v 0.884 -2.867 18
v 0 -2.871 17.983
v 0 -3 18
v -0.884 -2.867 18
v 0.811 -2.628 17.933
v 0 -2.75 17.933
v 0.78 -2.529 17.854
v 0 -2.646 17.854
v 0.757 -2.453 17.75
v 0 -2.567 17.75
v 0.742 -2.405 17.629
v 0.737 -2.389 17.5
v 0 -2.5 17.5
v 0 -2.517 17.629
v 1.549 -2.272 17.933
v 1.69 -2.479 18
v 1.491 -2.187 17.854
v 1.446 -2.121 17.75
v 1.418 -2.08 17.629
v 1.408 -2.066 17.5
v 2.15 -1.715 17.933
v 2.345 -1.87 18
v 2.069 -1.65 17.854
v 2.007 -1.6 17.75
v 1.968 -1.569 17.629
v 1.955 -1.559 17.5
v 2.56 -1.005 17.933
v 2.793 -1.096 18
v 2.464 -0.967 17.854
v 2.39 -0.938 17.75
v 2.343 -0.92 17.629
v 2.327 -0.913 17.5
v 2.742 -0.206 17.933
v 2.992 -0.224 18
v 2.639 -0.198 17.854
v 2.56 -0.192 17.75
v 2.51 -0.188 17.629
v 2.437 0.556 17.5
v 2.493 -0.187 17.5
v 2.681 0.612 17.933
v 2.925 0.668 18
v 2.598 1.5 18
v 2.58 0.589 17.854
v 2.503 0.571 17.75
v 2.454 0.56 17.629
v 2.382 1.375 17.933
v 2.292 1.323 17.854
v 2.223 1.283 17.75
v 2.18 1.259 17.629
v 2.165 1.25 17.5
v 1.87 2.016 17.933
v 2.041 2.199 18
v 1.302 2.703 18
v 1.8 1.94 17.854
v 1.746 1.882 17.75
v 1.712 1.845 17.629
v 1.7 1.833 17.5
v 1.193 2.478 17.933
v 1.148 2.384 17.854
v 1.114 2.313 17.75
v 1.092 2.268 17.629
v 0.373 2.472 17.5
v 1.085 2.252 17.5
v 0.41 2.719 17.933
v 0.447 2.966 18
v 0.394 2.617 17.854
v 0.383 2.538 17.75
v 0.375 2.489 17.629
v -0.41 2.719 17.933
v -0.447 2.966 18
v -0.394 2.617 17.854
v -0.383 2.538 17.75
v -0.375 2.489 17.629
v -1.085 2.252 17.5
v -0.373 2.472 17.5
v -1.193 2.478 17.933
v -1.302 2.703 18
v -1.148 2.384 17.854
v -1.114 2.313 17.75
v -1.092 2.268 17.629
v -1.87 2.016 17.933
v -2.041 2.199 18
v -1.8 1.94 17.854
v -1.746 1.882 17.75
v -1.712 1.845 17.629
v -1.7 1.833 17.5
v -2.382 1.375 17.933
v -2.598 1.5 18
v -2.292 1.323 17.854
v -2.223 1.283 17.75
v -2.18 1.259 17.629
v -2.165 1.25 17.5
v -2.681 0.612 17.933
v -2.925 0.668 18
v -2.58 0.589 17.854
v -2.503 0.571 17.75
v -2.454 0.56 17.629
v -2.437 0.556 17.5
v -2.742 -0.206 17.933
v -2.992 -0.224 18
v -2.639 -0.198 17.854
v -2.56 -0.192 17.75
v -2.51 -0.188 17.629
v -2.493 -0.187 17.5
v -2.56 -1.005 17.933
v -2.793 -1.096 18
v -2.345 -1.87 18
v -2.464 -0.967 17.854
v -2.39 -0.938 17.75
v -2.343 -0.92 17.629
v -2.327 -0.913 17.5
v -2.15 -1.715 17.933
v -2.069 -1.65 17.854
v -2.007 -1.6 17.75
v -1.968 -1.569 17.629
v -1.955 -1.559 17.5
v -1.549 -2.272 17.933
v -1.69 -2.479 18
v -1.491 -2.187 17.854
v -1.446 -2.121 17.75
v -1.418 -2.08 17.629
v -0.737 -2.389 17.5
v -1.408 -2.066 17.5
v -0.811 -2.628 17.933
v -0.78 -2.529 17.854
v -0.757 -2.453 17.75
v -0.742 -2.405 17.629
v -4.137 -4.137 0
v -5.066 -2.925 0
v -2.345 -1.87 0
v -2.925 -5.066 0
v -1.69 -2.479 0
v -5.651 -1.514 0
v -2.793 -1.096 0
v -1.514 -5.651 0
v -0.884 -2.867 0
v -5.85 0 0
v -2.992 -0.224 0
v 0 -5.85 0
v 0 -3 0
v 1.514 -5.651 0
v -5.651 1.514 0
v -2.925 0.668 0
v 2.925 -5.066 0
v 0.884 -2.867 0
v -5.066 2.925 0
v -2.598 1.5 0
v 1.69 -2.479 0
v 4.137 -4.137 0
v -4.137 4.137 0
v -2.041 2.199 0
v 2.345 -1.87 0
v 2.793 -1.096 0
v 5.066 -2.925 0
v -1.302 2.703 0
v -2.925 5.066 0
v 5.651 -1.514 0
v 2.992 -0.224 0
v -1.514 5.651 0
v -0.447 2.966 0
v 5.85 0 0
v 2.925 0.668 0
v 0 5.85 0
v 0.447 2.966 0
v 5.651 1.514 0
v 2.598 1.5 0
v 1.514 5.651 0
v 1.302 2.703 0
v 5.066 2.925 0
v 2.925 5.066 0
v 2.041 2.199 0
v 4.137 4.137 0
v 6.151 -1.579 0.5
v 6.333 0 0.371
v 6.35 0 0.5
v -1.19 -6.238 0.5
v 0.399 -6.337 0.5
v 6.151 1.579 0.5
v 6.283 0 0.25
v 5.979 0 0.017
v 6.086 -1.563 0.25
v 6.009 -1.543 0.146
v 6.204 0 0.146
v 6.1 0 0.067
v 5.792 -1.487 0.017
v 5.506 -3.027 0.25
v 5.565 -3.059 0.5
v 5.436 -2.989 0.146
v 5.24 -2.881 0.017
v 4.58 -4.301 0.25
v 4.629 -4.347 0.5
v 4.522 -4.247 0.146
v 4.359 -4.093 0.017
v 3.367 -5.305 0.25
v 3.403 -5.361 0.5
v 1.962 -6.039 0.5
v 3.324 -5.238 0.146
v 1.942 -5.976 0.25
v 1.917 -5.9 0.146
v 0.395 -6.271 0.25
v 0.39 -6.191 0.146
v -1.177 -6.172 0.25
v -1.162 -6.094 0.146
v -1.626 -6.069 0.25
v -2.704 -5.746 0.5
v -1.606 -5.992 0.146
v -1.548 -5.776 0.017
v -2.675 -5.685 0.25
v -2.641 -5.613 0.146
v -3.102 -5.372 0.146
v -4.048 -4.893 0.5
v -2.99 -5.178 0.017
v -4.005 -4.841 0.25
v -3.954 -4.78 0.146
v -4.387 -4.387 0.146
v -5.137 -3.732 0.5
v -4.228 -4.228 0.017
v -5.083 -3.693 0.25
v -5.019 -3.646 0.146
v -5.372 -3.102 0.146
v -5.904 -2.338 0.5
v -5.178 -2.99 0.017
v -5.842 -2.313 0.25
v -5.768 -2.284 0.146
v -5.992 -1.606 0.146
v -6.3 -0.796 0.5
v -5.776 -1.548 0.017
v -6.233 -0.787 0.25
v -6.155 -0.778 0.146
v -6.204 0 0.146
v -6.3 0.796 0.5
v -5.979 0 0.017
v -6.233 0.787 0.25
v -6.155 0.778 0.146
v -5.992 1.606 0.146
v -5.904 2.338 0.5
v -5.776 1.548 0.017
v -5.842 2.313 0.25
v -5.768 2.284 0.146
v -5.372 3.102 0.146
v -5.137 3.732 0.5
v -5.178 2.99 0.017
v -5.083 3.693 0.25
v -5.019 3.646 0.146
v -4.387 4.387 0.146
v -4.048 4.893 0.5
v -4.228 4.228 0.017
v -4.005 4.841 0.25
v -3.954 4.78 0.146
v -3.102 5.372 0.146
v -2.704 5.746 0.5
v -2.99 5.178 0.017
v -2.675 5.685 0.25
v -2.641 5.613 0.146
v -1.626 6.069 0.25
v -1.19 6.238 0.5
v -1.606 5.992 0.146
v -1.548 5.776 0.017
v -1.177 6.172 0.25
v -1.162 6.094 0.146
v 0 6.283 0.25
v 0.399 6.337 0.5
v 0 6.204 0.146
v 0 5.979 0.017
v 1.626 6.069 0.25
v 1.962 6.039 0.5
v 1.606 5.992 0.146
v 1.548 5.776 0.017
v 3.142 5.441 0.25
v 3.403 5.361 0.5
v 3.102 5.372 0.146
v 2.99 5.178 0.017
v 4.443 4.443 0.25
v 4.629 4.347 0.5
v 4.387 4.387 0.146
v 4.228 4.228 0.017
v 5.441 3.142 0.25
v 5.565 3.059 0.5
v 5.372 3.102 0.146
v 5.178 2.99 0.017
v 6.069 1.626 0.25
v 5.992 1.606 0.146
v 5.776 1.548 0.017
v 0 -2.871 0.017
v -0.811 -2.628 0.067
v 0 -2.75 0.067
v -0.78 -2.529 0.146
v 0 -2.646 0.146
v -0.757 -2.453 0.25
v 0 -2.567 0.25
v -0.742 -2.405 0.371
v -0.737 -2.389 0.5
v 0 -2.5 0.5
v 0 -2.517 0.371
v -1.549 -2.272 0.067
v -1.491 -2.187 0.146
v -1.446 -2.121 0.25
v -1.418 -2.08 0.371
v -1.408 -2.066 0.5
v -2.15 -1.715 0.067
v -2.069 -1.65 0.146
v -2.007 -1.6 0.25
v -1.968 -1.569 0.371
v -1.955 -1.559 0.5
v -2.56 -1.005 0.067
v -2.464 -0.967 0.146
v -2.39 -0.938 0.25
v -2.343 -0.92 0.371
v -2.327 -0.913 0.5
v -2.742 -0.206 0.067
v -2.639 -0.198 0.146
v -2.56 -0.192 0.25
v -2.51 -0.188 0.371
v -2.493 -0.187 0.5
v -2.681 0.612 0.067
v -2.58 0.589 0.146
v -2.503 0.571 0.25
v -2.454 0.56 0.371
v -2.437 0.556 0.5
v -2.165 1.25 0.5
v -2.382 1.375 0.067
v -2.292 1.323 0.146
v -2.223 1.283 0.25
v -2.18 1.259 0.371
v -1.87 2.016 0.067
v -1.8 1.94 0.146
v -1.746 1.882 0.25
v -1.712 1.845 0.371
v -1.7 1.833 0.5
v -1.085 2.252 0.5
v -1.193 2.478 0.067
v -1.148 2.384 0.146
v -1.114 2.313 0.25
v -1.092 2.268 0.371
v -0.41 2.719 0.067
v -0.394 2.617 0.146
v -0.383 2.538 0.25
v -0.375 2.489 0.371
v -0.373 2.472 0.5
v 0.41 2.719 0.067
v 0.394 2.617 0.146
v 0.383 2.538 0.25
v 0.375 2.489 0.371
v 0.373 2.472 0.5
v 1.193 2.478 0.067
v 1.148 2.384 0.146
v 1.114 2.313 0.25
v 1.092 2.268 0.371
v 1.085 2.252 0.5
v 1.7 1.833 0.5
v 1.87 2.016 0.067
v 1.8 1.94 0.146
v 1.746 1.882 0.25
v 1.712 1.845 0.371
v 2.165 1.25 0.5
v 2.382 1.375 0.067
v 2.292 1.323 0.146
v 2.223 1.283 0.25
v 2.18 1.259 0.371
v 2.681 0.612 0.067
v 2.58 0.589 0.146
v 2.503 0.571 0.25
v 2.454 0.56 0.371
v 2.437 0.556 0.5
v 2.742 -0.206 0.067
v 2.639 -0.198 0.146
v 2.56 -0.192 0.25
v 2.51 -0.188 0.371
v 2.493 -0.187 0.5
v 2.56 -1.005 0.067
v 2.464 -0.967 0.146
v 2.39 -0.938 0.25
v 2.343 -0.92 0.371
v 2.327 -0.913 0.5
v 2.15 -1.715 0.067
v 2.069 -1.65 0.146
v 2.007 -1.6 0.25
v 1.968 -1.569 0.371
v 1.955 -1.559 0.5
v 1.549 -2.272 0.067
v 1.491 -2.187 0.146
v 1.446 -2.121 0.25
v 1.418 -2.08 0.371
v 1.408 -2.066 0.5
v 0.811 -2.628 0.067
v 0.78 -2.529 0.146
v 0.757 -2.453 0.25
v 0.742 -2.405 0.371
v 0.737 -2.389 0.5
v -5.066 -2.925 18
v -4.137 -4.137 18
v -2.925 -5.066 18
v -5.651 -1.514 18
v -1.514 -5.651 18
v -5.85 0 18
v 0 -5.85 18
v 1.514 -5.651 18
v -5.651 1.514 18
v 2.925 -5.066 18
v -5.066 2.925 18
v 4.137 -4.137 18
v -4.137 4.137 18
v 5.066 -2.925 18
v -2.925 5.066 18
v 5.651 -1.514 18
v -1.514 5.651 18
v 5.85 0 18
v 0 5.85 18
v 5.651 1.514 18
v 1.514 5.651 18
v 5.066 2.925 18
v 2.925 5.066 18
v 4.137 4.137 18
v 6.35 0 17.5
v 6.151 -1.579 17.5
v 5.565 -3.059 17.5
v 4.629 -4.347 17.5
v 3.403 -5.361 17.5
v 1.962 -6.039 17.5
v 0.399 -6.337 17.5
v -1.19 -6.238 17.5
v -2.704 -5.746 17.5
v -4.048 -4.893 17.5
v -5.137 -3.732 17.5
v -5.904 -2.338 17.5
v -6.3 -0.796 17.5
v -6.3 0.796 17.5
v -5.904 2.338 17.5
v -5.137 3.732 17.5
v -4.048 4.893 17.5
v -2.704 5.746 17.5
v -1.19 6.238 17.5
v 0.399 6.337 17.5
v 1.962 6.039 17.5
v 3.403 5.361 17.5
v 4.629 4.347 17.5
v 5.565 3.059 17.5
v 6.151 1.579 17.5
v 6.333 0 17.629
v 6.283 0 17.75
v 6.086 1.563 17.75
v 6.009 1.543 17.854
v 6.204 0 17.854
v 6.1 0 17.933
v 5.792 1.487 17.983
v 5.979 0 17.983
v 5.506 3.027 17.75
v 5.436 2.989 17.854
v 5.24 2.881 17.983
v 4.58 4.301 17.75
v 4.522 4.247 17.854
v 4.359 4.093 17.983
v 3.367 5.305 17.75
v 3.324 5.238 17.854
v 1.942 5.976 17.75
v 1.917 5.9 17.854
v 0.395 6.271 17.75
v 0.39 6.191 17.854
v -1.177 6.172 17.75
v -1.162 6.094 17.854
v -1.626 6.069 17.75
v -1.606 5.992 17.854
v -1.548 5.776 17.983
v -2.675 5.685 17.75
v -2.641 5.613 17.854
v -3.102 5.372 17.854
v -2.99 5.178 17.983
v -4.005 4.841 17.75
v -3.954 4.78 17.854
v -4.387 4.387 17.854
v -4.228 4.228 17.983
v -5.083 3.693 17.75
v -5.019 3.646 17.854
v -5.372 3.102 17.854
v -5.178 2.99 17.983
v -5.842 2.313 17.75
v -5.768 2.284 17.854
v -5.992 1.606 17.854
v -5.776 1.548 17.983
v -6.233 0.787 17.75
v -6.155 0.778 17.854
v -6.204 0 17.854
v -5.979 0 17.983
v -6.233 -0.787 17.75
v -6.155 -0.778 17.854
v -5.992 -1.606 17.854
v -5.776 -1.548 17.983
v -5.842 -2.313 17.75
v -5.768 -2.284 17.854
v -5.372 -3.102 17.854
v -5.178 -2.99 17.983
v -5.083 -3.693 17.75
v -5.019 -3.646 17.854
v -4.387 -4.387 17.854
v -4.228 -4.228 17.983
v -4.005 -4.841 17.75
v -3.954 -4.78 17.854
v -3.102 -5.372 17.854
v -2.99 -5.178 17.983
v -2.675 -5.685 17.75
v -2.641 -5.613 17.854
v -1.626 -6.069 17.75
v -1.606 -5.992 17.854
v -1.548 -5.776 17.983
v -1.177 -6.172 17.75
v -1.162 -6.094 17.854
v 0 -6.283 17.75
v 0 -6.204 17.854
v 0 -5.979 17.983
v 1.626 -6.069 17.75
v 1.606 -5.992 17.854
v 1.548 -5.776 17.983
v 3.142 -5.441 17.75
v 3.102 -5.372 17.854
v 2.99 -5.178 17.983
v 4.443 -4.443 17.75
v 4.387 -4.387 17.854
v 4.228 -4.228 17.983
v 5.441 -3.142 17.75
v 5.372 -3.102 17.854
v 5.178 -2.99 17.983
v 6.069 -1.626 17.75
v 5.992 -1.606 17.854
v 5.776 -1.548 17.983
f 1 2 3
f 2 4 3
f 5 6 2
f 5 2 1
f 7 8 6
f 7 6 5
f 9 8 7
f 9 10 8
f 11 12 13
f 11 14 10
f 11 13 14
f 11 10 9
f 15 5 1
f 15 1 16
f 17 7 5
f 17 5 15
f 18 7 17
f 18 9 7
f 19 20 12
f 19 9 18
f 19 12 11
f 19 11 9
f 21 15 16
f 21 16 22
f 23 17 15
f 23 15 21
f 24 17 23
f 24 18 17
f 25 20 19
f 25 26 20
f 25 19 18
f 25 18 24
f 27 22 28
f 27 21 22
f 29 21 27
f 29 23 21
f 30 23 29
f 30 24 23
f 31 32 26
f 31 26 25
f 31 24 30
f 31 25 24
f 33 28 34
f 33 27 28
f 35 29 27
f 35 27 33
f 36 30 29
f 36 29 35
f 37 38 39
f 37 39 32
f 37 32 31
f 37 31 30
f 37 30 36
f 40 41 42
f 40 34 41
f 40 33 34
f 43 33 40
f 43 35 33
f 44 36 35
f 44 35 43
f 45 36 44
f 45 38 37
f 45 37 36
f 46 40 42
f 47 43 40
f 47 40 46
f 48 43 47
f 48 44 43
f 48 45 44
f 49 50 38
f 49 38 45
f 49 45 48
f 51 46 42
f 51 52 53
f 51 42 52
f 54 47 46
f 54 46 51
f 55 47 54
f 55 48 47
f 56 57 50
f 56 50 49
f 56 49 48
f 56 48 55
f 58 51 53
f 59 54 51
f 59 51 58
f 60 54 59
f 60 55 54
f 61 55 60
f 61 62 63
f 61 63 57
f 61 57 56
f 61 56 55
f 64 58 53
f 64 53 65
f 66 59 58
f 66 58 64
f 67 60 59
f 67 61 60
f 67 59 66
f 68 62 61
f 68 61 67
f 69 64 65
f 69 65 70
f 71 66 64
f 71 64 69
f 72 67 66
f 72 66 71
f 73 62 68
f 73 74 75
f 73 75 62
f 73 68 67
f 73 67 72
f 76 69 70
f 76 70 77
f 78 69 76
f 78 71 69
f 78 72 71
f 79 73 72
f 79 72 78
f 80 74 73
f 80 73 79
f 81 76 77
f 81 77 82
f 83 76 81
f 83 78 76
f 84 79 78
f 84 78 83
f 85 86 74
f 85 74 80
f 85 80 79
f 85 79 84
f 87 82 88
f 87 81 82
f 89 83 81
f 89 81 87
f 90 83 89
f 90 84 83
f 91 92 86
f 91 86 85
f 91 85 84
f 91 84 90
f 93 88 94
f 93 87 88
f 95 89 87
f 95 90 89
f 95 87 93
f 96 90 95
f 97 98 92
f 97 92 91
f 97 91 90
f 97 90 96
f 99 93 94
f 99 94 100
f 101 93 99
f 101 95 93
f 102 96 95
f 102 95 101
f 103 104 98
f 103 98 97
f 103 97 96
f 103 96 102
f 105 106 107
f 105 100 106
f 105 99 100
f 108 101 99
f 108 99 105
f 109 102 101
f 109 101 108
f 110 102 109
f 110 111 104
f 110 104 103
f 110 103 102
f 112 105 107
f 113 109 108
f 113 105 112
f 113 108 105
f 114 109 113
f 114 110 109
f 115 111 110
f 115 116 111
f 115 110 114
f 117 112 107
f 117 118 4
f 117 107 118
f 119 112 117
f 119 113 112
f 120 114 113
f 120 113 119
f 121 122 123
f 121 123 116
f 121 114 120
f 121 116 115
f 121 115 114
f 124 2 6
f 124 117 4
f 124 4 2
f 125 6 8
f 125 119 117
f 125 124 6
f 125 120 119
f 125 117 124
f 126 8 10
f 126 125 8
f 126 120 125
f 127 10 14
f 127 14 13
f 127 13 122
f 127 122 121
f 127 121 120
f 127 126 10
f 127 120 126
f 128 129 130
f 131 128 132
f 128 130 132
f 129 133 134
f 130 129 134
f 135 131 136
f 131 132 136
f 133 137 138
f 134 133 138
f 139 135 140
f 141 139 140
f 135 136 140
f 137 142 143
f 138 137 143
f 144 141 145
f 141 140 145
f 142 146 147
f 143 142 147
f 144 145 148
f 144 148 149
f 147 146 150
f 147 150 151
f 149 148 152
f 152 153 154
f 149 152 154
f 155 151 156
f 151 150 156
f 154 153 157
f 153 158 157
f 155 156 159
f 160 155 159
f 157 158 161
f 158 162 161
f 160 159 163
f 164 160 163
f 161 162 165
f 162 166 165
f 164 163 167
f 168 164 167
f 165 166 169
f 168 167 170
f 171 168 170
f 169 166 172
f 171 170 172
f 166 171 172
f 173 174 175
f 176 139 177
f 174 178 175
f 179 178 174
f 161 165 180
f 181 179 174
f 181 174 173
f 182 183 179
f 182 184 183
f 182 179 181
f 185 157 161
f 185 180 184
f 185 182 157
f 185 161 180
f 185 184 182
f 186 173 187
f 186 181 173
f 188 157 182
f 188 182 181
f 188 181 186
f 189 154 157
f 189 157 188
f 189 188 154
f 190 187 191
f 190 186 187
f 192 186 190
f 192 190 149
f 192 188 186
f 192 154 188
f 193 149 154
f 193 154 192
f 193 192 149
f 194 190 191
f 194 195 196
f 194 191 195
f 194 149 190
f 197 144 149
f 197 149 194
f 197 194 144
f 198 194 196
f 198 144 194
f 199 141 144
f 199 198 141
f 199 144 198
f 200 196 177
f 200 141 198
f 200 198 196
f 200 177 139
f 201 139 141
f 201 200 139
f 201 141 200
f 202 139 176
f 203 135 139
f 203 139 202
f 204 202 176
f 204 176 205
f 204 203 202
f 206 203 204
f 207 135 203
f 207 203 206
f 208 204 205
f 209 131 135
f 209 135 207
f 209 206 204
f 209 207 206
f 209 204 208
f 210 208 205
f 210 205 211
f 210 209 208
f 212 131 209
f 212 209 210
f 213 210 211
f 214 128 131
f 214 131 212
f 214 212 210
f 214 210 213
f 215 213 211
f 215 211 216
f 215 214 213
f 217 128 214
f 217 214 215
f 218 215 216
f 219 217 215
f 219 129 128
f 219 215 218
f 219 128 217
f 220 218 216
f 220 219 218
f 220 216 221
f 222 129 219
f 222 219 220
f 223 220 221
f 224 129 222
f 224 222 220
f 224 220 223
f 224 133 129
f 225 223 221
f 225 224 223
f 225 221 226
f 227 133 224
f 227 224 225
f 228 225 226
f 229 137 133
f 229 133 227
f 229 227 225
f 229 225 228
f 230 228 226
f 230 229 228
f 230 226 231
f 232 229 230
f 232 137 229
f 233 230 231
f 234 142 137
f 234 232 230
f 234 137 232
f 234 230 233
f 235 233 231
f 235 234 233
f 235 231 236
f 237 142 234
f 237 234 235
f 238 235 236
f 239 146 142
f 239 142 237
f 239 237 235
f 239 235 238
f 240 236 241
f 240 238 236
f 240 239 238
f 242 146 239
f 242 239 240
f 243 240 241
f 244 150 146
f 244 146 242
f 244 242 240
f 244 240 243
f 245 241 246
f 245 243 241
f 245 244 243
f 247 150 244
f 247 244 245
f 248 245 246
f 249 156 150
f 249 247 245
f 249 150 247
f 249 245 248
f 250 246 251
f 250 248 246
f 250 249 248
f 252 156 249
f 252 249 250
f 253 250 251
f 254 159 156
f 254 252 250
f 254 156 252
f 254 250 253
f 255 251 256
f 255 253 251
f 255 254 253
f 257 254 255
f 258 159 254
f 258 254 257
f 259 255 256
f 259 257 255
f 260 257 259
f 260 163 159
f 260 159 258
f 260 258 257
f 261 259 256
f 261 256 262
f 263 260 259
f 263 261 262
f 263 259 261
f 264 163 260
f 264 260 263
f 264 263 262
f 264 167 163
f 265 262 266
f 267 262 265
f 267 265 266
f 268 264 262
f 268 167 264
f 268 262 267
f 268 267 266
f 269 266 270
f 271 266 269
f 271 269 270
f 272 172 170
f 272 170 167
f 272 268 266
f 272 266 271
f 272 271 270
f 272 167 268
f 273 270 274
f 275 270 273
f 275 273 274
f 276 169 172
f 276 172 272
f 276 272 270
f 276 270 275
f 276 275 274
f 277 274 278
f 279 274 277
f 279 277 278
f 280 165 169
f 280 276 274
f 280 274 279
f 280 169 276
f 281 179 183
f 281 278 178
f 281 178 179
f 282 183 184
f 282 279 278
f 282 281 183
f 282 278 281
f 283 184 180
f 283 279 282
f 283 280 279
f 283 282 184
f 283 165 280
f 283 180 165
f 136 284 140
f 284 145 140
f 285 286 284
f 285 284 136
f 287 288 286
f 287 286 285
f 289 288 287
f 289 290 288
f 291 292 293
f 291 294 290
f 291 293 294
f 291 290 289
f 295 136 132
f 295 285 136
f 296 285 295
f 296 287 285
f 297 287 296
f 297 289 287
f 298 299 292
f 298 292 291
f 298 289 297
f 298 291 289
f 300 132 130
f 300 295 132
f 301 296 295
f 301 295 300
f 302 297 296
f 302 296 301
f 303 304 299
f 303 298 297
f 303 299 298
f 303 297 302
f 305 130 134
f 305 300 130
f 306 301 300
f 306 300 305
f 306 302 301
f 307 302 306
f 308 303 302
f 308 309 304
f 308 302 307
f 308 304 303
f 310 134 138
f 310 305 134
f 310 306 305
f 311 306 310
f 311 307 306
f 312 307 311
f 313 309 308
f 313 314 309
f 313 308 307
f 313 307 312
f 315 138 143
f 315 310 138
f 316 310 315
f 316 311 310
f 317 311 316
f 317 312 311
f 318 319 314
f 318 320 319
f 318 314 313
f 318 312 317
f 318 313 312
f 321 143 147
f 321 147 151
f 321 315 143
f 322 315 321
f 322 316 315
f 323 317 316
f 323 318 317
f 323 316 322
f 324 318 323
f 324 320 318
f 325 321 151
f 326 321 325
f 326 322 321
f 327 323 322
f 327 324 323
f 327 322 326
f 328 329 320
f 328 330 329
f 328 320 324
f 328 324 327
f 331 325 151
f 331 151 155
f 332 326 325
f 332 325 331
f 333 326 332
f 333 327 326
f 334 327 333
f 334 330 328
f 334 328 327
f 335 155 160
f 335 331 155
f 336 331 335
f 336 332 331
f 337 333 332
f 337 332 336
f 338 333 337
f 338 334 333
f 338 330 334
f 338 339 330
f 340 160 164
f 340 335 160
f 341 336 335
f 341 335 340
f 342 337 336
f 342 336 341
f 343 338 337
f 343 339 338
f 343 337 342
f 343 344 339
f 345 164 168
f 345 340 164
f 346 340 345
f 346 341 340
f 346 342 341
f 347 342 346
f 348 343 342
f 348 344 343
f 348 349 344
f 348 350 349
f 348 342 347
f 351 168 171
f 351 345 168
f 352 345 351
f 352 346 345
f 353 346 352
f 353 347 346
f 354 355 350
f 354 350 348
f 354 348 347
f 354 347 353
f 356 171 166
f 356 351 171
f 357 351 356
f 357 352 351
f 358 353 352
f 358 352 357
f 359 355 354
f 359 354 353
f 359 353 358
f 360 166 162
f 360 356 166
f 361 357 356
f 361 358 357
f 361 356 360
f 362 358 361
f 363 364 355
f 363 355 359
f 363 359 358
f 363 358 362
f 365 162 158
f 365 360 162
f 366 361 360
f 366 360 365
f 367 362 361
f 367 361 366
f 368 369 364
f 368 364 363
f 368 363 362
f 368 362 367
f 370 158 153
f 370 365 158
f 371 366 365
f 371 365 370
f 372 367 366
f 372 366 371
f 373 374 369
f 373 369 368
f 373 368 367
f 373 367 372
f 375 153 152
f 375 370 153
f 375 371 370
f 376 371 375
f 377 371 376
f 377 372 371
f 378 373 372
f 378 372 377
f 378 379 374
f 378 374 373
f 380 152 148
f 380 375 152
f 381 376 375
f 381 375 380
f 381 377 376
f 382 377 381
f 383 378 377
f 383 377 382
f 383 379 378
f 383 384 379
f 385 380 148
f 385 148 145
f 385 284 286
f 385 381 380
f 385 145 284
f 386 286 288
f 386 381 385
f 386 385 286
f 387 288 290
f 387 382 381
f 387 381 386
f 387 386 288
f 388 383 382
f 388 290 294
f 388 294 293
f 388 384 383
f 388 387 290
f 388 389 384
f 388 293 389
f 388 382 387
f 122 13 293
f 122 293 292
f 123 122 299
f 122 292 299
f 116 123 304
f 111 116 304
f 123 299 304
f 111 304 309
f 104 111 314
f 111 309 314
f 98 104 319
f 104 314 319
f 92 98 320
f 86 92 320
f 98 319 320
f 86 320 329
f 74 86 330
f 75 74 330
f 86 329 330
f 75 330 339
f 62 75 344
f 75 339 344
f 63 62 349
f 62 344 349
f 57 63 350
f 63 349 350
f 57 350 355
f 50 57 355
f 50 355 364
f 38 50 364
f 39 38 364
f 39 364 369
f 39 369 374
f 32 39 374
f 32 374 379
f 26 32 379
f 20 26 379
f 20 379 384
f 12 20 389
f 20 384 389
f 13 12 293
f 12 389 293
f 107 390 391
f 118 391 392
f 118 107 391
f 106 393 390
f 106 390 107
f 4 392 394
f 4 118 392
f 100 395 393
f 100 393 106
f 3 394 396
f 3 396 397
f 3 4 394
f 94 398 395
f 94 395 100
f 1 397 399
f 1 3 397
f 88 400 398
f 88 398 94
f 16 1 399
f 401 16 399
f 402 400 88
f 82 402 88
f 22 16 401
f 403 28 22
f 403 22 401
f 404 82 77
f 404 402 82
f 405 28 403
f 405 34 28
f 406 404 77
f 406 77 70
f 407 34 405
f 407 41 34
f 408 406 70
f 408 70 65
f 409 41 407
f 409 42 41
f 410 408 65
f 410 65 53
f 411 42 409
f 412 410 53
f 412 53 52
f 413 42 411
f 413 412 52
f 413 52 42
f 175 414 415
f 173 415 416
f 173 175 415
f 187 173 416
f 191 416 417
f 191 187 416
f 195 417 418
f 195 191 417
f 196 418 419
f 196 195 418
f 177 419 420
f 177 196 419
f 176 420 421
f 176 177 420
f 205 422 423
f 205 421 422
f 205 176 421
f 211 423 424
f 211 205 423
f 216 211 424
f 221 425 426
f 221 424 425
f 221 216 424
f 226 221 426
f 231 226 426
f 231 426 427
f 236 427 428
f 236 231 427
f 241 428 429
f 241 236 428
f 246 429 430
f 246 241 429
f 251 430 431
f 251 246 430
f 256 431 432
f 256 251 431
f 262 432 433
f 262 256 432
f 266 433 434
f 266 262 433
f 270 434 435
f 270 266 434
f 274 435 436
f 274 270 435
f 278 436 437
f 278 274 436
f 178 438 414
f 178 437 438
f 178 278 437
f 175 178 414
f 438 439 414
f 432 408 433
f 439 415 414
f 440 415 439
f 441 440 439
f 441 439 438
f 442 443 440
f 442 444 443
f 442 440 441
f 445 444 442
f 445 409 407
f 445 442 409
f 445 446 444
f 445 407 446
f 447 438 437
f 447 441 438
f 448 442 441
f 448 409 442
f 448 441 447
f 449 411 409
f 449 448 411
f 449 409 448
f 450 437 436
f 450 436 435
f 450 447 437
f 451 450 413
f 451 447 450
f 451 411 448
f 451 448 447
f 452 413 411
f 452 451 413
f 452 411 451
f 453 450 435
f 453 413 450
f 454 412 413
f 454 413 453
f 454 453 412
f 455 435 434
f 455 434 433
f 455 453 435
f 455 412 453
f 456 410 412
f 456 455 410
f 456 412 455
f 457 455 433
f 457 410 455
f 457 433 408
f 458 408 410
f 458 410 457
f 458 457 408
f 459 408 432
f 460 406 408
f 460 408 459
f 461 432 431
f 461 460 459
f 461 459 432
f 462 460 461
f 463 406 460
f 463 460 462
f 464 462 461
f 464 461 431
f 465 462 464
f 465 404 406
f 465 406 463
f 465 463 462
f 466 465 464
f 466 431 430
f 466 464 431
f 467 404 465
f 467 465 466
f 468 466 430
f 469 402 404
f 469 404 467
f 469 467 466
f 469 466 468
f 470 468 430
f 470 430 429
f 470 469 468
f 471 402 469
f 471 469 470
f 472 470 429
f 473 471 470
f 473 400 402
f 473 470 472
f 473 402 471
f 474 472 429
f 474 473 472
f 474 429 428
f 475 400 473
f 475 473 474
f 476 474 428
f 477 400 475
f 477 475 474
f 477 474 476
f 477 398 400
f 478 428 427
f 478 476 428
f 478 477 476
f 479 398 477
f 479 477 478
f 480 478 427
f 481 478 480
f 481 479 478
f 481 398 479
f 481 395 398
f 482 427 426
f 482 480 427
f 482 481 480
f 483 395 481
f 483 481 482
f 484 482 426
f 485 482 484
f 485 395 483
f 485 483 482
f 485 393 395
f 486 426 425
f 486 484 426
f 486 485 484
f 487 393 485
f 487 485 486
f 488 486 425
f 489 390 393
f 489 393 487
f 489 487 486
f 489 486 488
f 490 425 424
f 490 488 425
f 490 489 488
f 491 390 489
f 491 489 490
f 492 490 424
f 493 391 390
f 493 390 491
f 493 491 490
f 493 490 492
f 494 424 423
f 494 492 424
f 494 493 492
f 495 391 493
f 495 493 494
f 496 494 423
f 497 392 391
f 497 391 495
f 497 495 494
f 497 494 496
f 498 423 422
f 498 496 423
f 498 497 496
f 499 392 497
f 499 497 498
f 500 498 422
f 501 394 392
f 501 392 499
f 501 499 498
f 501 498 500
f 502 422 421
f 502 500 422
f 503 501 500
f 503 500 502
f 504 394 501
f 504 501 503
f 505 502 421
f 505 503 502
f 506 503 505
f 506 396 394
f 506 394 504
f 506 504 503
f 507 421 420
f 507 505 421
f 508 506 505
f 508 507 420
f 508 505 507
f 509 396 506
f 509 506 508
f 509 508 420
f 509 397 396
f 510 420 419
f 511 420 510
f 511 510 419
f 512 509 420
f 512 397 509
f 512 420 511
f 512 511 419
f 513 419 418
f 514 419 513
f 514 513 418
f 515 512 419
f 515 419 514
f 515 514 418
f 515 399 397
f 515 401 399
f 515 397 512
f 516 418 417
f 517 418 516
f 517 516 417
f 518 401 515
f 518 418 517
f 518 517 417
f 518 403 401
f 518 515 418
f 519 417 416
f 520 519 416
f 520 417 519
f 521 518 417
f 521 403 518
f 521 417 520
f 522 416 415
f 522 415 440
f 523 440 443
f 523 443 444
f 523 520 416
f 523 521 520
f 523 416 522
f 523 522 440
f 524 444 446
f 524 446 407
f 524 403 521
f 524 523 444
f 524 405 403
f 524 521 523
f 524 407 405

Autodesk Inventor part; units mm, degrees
ref_plane "YZ Plane" through (0, 0, 0) normal (1, 0, 0) x (0, 1, 0)
ref_plane "XZ Plane" through (0, 0, 0) normal (0, 1, 0) x (-1, 0, 0)
ref_plane "XY Plane" through (0, 0, 0) normal (0, 0, 1) x (1, 0, 0)
sketch "Sketch1" plane through (0, 0, 0) normal (0, 0, 1) x (1, 0, 0)
  circle A0 centre (0, 0) radius 6.35
  dimension "d0" = 12.7
extrude "Extrusion1" add sketch "Sketch1" along normal blind 18
hole "Hole1" at (0, 0, 18) direction (0, 0, -1) diameter 5 end through all
fillet "Fillet1" radius 0.5 4 edges at (-6.35, 0, 18) (0, 2.5, 18) (0, 2.5, 0) (-6.35, 0, 0)
properties part number "Idler" material "Nylon-6/6"
